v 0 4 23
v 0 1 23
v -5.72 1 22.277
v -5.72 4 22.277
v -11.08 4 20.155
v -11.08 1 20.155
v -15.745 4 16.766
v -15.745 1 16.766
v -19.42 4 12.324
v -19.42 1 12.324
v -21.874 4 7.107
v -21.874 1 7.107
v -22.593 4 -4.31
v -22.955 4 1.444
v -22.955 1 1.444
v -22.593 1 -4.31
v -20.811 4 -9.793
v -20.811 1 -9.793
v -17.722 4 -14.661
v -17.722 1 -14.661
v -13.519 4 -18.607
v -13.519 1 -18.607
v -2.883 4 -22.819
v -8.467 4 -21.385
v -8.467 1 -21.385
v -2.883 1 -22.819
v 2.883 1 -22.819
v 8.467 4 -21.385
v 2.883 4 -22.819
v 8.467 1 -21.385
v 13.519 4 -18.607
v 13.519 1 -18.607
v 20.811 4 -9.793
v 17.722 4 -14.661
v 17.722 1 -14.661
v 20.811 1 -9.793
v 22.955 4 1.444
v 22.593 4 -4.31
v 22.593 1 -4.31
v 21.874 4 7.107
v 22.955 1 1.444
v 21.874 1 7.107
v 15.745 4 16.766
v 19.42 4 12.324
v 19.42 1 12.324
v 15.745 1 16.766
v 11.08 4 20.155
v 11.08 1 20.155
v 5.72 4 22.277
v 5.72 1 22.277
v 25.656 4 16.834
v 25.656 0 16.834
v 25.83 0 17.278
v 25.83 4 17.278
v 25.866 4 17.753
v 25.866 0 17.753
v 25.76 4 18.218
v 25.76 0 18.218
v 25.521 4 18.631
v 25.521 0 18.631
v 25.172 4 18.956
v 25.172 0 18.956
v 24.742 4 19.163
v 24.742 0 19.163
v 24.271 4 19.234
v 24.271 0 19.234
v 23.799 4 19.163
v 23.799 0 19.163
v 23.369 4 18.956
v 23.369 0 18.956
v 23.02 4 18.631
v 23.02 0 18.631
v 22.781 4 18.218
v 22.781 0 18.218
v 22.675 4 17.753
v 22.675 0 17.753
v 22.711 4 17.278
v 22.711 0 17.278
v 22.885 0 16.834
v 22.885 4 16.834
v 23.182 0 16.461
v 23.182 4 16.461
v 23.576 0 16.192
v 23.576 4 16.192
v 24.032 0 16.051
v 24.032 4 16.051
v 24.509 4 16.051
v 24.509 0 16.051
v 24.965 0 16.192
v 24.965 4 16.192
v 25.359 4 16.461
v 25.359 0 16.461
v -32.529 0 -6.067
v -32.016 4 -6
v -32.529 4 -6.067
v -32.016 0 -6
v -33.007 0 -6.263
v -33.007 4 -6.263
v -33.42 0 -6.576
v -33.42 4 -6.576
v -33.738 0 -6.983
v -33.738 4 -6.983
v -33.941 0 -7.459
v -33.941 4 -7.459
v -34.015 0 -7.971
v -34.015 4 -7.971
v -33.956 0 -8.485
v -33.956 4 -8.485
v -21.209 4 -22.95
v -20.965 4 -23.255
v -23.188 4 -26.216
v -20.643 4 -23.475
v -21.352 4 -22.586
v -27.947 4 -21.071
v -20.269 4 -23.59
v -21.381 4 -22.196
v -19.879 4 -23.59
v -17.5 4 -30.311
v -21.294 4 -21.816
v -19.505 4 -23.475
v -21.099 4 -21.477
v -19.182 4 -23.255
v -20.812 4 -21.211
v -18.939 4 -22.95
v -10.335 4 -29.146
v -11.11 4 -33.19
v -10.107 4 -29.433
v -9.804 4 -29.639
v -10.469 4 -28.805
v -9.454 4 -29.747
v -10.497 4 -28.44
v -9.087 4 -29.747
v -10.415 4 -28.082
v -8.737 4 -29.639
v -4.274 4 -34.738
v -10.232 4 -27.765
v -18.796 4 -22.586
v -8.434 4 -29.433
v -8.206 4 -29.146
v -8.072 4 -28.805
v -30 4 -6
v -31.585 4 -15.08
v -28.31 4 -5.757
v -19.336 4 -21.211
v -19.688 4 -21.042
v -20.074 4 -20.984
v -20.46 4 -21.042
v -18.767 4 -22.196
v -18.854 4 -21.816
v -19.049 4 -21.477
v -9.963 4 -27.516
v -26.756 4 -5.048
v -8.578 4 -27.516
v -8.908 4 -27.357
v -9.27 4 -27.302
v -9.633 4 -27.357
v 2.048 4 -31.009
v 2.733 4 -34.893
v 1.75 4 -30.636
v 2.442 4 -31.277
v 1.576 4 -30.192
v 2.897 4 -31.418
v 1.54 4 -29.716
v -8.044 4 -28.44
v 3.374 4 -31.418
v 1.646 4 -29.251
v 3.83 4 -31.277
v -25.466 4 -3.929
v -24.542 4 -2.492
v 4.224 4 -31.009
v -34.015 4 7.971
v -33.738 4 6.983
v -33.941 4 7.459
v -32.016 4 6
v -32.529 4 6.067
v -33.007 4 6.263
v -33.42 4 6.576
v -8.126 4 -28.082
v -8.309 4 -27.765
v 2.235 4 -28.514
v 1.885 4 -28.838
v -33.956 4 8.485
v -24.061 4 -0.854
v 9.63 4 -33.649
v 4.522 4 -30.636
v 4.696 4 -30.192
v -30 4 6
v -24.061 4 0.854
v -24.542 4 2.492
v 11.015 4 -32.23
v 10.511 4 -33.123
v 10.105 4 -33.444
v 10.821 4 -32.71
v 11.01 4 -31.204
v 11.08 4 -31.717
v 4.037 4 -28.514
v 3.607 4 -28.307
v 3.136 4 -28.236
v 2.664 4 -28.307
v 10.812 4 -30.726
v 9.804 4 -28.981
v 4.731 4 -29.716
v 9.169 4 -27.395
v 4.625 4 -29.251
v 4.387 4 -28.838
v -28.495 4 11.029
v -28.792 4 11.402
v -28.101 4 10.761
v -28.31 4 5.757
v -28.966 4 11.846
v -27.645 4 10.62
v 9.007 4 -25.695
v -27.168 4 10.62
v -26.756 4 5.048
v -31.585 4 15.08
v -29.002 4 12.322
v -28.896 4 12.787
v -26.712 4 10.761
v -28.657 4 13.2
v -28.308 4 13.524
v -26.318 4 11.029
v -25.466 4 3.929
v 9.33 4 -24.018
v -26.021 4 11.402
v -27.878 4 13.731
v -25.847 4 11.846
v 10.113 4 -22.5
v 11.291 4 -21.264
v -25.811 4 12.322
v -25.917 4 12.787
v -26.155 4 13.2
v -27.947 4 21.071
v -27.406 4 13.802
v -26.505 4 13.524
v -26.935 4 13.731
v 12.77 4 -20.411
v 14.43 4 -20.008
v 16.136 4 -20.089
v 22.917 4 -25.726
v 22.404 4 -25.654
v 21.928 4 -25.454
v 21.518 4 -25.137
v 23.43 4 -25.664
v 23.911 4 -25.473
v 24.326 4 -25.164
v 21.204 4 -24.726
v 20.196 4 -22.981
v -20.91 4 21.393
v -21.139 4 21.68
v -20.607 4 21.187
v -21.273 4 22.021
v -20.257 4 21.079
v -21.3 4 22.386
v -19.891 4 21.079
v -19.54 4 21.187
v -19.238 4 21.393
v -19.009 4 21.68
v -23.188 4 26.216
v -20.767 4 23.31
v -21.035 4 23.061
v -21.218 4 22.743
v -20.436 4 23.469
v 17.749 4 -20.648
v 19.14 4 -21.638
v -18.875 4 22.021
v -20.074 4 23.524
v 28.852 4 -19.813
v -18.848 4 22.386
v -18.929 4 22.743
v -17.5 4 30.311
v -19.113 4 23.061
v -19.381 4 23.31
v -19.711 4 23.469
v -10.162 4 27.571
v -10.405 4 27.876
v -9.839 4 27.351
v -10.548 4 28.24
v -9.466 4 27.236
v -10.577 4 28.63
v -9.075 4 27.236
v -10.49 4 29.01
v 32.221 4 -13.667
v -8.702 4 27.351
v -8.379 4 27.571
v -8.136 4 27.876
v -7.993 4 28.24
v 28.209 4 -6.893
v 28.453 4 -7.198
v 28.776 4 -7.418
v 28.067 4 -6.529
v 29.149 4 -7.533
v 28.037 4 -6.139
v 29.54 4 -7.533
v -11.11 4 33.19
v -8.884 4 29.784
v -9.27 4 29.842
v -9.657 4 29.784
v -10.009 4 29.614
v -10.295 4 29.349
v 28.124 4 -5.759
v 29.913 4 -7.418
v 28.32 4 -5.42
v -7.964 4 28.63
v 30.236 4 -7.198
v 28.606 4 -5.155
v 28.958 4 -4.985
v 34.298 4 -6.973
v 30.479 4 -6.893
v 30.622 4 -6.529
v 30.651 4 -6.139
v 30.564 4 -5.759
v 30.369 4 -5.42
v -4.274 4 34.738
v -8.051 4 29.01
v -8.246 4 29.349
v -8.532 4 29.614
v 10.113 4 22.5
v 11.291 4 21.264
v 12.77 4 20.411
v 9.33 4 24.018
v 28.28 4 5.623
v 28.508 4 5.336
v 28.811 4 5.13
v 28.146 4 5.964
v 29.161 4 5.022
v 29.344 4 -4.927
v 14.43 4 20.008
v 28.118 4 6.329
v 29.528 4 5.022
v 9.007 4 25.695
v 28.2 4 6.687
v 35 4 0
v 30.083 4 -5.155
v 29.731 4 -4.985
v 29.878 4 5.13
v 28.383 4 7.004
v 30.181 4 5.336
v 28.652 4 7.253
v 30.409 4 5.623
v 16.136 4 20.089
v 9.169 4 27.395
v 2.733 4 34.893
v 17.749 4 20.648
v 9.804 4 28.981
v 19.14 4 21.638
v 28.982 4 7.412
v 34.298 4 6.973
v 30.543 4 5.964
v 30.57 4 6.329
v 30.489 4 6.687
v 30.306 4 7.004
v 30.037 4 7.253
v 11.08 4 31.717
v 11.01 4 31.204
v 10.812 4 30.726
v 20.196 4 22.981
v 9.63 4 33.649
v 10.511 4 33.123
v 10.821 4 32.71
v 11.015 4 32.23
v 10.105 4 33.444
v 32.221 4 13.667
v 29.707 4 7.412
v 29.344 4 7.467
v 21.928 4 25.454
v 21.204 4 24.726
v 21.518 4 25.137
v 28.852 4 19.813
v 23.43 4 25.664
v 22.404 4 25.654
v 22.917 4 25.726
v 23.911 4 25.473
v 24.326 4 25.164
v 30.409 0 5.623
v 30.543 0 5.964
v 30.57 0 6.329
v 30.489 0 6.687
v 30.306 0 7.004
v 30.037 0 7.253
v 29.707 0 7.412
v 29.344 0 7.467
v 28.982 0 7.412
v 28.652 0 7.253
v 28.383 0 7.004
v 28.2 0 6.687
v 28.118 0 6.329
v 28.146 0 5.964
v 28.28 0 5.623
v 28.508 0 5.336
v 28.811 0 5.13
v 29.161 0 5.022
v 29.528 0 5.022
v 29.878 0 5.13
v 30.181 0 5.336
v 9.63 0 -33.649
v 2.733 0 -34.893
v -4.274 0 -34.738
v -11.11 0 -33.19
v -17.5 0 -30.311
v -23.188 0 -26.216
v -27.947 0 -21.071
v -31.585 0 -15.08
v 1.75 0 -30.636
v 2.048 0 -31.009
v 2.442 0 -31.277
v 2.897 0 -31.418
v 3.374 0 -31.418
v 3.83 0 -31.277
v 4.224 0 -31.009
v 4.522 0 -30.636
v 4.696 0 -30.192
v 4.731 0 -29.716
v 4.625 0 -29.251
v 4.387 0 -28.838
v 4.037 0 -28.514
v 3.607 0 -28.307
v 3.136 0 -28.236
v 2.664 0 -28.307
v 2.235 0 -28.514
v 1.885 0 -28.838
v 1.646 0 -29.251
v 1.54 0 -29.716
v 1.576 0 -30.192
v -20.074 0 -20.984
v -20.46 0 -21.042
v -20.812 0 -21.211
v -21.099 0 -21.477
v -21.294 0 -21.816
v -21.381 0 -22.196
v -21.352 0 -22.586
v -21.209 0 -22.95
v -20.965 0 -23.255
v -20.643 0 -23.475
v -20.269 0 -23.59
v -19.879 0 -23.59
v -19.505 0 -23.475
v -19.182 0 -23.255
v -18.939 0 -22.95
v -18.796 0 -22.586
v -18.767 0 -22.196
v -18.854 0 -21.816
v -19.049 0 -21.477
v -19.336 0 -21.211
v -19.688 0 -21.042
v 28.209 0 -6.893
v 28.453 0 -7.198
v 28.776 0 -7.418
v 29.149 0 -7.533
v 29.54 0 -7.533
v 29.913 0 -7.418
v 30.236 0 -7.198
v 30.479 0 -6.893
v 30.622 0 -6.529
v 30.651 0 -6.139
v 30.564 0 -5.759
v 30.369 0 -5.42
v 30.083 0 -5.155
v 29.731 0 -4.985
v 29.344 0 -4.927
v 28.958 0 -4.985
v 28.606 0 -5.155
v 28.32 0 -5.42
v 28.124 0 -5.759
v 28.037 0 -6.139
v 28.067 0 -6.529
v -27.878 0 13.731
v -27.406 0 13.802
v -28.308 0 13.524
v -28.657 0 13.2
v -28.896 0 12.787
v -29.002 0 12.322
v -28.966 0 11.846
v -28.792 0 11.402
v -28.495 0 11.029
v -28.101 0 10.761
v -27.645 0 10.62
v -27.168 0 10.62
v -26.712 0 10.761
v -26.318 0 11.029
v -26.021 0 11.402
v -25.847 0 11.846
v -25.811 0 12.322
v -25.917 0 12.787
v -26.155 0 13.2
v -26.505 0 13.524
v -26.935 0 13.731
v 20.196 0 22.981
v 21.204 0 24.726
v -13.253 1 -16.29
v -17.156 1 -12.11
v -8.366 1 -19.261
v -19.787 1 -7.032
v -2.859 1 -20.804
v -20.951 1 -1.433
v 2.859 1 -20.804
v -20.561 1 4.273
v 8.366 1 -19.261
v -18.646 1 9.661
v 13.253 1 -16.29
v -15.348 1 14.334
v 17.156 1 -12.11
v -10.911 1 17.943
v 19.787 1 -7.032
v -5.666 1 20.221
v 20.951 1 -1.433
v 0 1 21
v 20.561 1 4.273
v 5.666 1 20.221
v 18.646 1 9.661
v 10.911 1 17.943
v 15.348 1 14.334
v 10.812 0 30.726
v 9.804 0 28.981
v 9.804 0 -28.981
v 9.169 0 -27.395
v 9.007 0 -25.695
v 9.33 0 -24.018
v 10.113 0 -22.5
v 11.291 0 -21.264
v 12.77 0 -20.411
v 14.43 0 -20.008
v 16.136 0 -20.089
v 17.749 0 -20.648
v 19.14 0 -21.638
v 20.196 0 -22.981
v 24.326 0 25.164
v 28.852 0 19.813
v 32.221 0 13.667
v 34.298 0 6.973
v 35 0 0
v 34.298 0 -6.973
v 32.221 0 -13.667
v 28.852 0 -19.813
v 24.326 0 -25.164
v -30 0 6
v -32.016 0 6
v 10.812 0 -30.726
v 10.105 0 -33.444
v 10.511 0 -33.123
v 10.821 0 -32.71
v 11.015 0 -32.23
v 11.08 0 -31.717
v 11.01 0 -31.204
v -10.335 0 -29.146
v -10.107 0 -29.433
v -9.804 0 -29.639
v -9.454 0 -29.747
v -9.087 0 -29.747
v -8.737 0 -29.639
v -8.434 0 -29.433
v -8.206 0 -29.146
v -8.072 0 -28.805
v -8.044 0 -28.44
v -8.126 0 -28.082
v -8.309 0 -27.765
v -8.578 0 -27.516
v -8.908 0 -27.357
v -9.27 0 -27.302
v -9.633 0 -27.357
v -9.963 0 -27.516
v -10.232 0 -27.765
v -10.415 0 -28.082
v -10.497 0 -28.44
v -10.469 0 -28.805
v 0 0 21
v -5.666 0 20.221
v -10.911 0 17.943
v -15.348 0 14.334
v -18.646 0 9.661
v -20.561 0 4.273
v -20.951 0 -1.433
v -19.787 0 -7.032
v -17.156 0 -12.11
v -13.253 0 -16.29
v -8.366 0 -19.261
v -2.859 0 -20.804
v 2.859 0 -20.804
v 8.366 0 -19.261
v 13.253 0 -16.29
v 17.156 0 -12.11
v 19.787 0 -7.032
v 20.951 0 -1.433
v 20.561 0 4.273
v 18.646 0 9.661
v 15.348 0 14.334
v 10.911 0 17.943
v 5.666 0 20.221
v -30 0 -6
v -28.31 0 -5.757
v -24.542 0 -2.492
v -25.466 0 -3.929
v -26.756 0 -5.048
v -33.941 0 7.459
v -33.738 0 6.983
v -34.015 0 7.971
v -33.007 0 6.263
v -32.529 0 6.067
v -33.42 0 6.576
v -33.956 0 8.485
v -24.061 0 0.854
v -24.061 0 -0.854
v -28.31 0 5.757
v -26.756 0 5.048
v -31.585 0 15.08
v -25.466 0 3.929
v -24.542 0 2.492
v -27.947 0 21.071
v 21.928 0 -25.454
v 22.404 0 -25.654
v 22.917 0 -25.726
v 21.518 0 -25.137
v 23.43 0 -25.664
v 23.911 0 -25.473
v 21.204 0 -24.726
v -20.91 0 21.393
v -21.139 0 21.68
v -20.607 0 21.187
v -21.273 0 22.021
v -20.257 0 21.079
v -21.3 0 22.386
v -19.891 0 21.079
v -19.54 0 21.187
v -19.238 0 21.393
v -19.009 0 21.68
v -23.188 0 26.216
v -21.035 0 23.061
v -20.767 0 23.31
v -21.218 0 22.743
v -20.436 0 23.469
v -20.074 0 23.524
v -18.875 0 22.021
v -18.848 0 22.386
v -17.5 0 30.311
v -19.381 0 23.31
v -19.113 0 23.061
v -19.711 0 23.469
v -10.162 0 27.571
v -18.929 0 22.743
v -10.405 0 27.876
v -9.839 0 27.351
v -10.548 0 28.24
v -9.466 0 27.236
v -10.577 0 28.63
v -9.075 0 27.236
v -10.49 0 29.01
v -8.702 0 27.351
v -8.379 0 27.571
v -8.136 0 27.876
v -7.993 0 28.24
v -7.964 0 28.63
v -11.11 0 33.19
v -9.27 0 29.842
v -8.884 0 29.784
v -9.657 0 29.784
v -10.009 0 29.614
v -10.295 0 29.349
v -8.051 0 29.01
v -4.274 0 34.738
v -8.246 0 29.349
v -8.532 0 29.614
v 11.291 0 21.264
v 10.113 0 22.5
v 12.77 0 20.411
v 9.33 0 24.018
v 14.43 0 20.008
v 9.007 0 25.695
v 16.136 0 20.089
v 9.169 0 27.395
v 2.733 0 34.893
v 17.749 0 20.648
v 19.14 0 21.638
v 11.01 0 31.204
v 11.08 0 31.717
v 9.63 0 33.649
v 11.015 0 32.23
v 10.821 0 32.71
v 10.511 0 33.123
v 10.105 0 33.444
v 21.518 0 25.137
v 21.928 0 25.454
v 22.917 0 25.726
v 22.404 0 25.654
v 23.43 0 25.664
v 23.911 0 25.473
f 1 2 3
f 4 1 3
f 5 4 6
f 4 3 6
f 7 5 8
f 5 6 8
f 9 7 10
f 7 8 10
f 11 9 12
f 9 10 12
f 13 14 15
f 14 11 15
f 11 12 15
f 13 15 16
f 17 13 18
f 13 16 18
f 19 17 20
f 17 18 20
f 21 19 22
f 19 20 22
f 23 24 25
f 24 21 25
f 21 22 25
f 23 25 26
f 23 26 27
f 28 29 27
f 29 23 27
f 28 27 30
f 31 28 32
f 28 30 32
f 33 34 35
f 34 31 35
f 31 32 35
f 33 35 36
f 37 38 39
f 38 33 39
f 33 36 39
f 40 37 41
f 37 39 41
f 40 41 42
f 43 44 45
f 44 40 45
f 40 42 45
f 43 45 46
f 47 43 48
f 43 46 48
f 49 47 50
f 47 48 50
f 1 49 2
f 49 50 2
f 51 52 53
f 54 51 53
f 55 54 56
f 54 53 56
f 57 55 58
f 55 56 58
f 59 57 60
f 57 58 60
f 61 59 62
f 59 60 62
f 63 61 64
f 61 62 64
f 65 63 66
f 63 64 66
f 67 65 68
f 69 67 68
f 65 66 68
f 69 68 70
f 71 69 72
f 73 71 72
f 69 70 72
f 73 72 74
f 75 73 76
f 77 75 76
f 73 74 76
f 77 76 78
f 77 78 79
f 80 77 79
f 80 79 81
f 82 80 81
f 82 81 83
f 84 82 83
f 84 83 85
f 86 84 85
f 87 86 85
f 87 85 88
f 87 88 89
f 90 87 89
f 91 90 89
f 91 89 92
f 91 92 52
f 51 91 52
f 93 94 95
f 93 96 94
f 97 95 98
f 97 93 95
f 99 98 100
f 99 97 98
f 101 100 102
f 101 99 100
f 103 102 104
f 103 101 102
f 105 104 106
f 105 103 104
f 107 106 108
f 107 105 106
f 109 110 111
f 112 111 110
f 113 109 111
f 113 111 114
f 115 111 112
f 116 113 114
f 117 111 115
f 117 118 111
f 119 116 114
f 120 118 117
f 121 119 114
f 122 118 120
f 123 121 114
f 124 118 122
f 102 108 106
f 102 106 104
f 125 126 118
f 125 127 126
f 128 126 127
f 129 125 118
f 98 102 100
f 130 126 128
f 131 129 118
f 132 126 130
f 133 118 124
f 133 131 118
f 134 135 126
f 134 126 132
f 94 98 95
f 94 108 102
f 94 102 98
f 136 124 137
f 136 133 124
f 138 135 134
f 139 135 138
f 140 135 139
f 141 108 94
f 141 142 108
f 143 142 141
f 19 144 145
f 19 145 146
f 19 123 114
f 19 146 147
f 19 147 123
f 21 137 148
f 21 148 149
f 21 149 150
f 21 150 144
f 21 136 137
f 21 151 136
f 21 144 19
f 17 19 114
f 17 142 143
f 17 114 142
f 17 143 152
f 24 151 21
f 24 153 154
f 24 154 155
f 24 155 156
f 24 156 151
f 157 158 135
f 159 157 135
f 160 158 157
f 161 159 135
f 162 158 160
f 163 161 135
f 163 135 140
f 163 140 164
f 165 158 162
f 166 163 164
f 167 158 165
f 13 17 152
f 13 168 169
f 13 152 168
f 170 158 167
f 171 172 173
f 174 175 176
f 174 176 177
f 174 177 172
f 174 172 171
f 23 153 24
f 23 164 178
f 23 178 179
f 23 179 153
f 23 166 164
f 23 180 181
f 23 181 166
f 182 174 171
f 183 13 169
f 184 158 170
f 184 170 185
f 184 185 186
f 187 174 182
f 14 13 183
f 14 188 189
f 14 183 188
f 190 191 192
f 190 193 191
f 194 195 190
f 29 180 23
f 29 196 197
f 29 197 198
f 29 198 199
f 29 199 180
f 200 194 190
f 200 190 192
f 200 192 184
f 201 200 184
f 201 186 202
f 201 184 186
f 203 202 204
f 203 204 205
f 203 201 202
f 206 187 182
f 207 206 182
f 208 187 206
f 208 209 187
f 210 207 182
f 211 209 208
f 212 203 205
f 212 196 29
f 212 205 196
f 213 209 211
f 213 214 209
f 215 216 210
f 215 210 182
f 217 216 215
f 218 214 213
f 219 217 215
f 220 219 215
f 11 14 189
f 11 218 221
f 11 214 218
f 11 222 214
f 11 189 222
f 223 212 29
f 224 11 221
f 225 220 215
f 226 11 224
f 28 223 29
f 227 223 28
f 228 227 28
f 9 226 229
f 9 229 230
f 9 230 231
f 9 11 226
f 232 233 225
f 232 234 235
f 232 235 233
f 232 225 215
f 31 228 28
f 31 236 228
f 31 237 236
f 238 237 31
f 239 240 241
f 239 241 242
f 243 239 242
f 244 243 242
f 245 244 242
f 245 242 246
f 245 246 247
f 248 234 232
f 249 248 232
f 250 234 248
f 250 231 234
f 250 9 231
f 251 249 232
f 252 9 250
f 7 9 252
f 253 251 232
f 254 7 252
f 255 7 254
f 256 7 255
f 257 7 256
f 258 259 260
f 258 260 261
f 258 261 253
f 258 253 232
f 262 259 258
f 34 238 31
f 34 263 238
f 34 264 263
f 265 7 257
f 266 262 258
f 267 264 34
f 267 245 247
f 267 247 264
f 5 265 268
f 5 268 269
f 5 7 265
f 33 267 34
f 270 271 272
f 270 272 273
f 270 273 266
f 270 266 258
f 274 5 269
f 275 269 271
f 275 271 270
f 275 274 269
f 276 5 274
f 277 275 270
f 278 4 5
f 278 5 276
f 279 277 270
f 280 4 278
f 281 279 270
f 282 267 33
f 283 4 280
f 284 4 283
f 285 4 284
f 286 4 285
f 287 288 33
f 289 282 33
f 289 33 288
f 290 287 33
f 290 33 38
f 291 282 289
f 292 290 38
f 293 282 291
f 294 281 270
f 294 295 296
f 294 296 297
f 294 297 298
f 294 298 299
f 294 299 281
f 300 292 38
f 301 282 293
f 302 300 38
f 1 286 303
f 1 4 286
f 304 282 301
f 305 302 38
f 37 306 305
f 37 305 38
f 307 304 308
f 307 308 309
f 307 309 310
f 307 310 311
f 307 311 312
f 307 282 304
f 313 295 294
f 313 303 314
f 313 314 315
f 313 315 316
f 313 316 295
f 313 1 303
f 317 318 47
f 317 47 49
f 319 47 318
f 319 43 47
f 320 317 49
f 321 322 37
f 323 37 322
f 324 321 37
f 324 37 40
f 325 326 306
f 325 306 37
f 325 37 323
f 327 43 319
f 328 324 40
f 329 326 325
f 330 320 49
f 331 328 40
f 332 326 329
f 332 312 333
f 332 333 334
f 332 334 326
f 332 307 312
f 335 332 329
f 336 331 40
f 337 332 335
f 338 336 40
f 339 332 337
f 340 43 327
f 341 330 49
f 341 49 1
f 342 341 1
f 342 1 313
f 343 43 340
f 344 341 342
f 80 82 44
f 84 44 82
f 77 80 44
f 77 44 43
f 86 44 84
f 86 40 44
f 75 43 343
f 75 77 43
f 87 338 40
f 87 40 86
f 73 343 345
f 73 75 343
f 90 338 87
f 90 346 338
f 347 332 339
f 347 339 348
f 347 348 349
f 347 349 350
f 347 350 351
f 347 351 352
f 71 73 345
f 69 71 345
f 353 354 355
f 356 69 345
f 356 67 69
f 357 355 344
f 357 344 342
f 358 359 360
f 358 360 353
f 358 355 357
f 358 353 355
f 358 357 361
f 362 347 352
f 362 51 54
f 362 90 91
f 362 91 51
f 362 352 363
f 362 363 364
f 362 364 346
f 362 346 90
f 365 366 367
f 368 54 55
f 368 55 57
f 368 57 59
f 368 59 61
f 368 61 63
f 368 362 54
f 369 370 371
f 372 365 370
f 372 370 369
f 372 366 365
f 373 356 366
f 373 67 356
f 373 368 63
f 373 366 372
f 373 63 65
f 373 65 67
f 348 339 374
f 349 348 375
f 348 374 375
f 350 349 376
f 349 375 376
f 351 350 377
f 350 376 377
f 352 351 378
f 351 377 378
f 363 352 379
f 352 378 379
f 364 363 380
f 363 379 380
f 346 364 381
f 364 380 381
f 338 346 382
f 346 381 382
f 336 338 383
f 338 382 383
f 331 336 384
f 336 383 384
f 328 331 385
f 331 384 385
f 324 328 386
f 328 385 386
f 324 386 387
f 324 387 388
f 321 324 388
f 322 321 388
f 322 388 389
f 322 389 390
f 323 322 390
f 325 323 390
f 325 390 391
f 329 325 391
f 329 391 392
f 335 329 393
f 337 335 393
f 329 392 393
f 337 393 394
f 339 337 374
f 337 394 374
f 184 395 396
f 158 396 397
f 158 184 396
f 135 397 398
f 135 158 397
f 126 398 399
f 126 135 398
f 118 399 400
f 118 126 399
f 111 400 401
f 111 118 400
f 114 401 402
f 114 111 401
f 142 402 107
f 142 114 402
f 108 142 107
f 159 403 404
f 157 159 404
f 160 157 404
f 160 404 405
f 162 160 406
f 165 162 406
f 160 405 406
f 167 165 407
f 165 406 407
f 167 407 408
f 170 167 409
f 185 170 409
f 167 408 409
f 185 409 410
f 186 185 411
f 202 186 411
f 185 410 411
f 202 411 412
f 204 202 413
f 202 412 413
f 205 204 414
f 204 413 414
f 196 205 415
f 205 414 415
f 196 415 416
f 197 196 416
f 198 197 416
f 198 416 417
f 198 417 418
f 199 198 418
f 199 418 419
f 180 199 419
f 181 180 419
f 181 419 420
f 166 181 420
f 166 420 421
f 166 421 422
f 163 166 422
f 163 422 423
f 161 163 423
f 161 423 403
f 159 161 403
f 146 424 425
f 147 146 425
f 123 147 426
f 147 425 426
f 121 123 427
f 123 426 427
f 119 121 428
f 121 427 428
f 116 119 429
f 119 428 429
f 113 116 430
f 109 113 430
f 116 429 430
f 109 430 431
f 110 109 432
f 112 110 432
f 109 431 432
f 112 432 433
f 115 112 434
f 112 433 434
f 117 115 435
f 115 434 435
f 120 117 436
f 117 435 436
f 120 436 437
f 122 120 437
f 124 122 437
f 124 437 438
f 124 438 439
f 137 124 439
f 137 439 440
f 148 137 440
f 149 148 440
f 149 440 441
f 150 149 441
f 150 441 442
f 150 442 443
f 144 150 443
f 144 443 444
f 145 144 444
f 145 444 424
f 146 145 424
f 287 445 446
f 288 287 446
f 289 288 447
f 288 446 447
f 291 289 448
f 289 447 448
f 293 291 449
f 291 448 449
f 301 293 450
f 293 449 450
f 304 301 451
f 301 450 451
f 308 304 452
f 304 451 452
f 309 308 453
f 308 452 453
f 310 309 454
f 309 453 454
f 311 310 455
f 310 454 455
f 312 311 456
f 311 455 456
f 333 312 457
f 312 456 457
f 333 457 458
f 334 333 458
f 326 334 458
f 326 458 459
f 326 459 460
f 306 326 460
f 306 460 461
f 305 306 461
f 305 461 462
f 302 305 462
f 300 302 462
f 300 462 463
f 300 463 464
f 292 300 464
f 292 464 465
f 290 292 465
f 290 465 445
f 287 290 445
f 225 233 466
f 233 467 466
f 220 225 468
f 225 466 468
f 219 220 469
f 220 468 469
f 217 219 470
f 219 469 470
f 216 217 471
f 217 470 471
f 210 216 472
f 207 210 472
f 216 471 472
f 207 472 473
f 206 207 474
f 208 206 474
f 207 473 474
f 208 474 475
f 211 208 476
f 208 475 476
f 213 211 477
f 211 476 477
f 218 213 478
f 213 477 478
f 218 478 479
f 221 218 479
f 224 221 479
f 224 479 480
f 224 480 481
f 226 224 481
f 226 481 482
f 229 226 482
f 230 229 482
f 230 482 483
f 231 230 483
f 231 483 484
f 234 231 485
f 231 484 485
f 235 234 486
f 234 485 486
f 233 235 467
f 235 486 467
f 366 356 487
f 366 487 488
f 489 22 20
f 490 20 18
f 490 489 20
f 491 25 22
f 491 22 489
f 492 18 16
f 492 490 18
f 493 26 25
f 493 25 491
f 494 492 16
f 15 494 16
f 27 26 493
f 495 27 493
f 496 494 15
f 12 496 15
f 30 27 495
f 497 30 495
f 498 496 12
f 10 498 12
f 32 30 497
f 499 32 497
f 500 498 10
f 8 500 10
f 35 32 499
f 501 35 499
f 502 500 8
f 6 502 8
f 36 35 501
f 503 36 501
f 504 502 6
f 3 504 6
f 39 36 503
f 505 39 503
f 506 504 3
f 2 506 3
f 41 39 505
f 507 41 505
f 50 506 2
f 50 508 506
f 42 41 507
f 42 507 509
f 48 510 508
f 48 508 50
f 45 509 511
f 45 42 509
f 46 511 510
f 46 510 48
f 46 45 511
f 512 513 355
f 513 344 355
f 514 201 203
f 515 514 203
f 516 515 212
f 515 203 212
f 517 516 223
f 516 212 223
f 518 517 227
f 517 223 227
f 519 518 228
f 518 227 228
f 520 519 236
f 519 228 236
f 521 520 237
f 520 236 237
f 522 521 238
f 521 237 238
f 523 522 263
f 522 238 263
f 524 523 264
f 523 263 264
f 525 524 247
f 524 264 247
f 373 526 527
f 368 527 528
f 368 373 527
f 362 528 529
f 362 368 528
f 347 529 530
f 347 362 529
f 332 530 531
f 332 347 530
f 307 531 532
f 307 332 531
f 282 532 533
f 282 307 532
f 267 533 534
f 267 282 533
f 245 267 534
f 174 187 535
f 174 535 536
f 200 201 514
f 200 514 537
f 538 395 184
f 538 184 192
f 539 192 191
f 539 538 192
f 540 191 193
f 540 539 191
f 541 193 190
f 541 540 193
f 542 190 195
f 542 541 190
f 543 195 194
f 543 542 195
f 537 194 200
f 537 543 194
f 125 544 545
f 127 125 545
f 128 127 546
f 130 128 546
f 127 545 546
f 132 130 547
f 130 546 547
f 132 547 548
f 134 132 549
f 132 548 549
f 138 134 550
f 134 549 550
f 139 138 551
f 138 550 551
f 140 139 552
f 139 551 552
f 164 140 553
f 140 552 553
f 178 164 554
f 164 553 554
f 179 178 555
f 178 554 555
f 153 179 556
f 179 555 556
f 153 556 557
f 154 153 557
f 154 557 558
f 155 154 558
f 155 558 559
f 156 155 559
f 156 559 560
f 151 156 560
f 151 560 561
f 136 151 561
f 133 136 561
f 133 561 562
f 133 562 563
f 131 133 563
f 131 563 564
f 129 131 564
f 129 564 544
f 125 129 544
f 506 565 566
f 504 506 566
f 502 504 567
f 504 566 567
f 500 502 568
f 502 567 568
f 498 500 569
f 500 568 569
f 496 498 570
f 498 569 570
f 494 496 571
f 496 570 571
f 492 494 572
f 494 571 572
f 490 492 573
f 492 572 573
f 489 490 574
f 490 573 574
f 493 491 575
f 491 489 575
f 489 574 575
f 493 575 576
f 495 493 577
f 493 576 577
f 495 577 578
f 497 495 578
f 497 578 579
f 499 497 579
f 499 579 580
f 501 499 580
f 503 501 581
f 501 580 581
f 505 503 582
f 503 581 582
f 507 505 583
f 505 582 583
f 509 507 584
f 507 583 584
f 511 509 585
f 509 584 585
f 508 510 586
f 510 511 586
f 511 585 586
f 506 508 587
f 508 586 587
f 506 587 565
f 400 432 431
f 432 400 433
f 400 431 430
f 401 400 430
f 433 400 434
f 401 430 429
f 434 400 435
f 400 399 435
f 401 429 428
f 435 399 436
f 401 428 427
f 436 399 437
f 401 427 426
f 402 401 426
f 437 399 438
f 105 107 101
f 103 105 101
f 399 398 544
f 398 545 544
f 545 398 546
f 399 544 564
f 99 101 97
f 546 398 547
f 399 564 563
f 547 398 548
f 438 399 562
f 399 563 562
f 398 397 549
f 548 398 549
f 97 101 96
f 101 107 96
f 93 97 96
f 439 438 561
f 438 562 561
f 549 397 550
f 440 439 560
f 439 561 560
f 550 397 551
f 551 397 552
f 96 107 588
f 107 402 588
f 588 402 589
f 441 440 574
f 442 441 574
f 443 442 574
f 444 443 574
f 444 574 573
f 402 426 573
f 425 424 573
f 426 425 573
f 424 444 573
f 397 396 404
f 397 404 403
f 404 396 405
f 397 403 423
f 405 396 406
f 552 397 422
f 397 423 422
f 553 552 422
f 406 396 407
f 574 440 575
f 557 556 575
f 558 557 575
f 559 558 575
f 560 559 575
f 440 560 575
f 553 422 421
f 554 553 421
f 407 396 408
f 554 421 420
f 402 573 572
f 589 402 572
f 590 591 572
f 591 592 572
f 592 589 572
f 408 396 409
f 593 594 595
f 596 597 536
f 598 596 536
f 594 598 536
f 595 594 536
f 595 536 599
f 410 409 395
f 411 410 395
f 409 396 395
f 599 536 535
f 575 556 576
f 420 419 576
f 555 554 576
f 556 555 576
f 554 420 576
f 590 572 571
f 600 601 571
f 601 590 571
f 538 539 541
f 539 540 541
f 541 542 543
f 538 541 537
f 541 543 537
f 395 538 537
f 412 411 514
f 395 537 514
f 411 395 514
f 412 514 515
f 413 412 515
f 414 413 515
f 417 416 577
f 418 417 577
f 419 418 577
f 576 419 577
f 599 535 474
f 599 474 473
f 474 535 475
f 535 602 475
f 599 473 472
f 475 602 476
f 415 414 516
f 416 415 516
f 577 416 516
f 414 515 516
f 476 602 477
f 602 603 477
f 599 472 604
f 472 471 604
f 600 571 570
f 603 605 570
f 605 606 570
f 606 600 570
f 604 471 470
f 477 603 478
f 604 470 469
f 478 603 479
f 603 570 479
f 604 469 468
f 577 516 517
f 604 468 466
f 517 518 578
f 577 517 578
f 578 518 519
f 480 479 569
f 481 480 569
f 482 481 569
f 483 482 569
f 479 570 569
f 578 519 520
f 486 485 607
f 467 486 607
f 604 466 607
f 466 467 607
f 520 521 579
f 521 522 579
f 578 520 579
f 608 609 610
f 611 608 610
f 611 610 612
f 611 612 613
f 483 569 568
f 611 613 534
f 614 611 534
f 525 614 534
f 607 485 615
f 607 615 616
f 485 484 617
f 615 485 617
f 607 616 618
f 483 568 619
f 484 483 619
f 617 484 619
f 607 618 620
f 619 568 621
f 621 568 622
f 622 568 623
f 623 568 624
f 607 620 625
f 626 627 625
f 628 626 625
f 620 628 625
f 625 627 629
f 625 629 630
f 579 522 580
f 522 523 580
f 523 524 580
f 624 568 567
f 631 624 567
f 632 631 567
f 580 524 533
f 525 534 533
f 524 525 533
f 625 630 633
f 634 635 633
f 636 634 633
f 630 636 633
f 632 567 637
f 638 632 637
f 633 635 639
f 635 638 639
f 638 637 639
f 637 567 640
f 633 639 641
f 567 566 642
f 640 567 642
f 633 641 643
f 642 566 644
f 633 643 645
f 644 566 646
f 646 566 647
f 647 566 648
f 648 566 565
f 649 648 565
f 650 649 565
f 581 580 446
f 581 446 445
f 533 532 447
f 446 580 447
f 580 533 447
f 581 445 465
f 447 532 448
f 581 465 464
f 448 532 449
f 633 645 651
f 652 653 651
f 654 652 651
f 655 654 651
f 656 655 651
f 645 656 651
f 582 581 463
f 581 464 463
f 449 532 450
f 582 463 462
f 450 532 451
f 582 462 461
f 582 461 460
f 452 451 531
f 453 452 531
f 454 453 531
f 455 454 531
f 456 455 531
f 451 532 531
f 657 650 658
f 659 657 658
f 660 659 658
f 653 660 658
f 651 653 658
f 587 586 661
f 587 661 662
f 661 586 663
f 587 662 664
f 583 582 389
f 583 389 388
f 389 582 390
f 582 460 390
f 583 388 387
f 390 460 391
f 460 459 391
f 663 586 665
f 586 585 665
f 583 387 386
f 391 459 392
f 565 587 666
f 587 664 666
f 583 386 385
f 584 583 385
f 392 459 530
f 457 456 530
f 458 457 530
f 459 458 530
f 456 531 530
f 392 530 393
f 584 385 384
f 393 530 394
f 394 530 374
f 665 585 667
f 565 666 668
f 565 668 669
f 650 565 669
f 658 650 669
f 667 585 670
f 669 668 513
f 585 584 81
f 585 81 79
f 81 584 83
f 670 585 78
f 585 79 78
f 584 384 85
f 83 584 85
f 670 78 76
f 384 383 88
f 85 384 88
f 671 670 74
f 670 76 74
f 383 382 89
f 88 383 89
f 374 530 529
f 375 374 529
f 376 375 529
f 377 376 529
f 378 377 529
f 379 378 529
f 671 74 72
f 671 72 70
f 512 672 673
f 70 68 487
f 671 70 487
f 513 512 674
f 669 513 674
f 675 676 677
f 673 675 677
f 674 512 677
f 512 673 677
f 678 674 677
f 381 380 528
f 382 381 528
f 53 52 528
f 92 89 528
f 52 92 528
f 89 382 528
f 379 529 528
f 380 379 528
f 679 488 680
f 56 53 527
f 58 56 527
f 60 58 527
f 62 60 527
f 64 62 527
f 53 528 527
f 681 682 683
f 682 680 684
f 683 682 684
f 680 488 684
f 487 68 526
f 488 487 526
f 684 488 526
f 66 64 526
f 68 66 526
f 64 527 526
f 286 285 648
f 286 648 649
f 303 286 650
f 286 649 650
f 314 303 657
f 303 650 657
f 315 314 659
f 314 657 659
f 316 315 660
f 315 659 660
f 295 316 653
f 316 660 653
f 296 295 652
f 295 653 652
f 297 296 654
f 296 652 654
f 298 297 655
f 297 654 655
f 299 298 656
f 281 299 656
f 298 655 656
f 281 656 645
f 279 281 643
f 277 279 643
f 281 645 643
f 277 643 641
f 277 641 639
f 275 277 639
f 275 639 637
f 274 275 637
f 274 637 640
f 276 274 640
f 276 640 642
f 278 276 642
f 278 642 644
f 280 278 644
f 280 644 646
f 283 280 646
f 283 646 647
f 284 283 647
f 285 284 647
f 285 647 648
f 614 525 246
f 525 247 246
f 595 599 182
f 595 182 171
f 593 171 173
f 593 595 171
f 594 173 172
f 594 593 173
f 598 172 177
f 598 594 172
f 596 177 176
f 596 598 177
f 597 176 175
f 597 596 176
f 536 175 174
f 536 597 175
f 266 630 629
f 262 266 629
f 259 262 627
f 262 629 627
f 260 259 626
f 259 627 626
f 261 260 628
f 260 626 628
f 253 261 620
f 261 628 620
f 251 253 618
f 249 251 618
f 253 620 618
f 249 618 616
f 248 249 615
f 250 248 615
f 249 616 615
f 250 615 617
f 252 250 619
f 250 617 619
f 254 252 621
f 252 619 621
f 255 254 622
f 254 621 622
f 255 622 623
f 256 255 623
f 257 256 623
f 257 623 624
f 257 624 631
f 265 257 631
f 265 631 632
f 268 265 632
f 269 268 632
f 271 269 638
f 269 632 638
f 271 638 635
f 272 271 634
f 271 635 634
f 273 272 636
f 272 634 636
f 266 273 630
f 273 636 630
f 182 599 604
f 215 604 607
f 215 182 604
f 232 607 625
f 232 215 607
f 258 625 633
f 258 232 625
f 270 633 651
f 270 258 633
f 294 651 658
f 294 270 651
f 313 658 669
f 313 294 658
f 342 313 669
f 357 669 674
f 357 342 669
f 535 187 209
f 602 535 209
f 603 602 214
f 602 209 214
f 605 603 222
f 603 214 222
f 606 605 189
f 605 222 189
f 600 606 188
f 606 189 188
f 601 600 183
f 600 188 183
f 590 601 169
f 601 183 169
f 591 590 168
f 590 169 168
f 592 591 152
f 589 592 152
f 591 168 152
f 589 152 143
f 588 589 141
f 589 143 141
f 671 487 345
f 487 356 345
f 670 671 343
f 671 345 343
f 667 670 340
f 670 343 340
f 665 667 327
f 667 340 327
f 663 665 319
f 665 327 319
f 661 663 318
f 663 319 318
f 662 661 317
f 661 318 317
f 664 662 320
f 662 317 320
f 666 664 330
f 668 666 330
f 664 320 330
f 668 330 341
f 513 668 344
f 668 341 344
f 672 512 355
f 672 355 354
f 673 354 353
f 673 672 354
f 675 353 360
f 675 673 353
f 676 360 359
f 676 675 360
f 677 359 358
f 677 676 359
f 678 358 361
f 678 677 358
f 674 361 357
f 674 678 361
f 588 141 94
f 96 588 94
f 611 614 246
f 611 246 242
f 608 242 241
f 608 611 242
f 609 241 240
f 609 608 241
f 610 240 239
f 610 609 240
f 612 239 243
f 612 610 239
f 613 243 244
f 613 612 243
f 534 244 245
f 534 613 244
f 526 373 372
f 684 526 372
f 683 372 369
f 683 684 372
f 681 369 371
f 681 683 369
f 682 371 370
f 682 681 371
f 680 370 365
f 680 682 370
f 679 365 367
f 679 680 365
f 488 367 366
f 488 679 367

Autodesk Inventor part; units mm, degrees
ref_plane "YZ Plane" through (0, 0, 0) normal (1, 0, 0) x (0, 1, 0)
ref_plane "XZ Plane" through (0, 0, 0) normal (0, 1, 0) x (-1, 0, 0)
ref_plane "XY Plane" through (0, 0, 0) normal (0, 0, 1) x (1, 0, 0)
sketch "Sketch1" plane through (0, 0, 0) normal (1, 0, 0) x (0, 1, 0)
  line L0 (0, 35) -> (4, 35)
  line L1 (4, 35) -> (4, 23)
  line L2 (1, 21) -> (0, 21)
  line L3 (0, 21) -> (0, 35)
  line L4 (-0.8, 0) -> (4.8, 0) projected
  line L5 (1, 23) -> (1, 21)
  line L6 (4, 23) -> (1, 23)
  point P0 (0, 0)
  dimension "d0" = 21
  dimension "d2" = 35
  dimension "d51" = 4
  dimension "d52" = 3
  dimension "d53" = 23
revolve "Revolution1" add sketch "Sketch1" angle 360 about axis through (0, -10, 0) along (0, 1, 0)
sketch "Sketch2" plane through (0, 4, 0) normal (0, 1, 0) x (1, 0, 0)
  arc A0 (-30, -6) -> (-30, 6) centre (-30, 0) ccw
  line L0 (-30, -6) -> (-34.4819, -6)
  circle A1 centre (0, 0) radius 35 projected
  line L1 (-30, 6) -> (-34.4819, 6)
  arc A2 (-34.4819, 6) -> (-34.4819, -6) centre (0, 0) ccw
  dimension "d6" = 12
  dimension "d7" = 30
extrude "Extrusion1" cut sketch "Sketch2" against normal blind 4 contours L0 A1 L1 A0 picked at (-31.3095, 0.2411)
pattern_circular "Circular Pattern1" count 3 over 360 about axis through (0, 0.5, 0) along (0, 1, 0) of "Extrusion1"
sketch "Sketch3" plane through (-34.4819, 4, -6) normal (0, 1, 0) x (1, 0, 0)
  point P0 (34.4819, -6)
sketch "Sketch4" plane through (-34.4819, 4, -6) normal (0, 1, 0) x (1, 0, 0)
  circle A0 centre (34.4819, -6) radius 30 construction
  arc A1 (4.4819, -12) -> (4.4819, 0) centre (4.4819, -6) ccw projected
  point P0 (7.0755, -18.2021)
  dimension "d13" = 60
  dimension "d14" = 24
hole "Hole1" at (-27.4064, 4, 12.2021) direction (0, -1, 0) diameter 3.2 end through all
pattern_circular "Circular Pattern2" count 3 over 360 about axis through (0, 0.5, 0) along (0, 1, 0) of "Hole1"
sketch "Sketch5" plane through (-34.4819, 4, -6) normal (0, 1, 0) x (1, 0, 0)
  circle A0 centre (34.4819, -6) radius 30 construction
  arc A1 (4.4819, -12) -> (4.4819, 0) centre (4.4819, -6) ccw projected
  point P0 (14.408, 16.2943)
  dimension "d25" = 60
  dimension "d26" = 48
hole "Hole2" at (-20.0739, 4, -22.2943) direction (0, -1, 0) diameter 2.6211 end through all thread size "M3x0.35" class "6H" standard "ANSI Metric M Profile"
pattern_circular "Circular Pattern3" count 3 over 360 about axis through (0, 0.5, 0) along (0, 1, 0) of "Hole2"
sketch "Sketch6" plane through (-34.4819, 4, -6) normal (0, 1, 0) x (1, 0, 0)
  circle A0 centre (7.0755, -18.2021) radius 1.6 projected
  line L0 (34.4819, -6) -> (7.0755, -18.2021) construction
  circle A1 centre (34.4819, -6) radius 21 projected
  circle A2 centre (25.2114, -34.5317) radius 1.3106 projected
  line L1 (34.4819, -6) -> (25.2114, -34.5317) construction
  circle A3 centre (34.4819, -6) radius 30 construction
  point P0 (14.408, -28.2943)
  dimension "d37" = 60
  dimension "d38" = 48
  dimension "d39" = 24
hole "Hole3" at (-20.0739, 4, 22.2943) direction (0, -1, 0) diameter 2.459 end through all thread size "M3x0.5" class "6H" standard "ANSI Metric M Profile"
pattern_circular "Circular Pattern4" count 3 over 360 about axis through (0, 0.5, 0) along (0, 1, 0) of "Hole3"
fillet "Fillet1" radius 2 6 edges at (12.0448, 2, 32.8622) (22.4371, 2, 26.8622) (22.4371, 2, -26.8622) (12.0448, 2, -32.8622) (-34.4819, 2, -6) (-34.4819, 2, 6)
equation "\"d39\" = 0.5 * d38"
properties part number "MiddleRing-2023-1" material "Copper"
